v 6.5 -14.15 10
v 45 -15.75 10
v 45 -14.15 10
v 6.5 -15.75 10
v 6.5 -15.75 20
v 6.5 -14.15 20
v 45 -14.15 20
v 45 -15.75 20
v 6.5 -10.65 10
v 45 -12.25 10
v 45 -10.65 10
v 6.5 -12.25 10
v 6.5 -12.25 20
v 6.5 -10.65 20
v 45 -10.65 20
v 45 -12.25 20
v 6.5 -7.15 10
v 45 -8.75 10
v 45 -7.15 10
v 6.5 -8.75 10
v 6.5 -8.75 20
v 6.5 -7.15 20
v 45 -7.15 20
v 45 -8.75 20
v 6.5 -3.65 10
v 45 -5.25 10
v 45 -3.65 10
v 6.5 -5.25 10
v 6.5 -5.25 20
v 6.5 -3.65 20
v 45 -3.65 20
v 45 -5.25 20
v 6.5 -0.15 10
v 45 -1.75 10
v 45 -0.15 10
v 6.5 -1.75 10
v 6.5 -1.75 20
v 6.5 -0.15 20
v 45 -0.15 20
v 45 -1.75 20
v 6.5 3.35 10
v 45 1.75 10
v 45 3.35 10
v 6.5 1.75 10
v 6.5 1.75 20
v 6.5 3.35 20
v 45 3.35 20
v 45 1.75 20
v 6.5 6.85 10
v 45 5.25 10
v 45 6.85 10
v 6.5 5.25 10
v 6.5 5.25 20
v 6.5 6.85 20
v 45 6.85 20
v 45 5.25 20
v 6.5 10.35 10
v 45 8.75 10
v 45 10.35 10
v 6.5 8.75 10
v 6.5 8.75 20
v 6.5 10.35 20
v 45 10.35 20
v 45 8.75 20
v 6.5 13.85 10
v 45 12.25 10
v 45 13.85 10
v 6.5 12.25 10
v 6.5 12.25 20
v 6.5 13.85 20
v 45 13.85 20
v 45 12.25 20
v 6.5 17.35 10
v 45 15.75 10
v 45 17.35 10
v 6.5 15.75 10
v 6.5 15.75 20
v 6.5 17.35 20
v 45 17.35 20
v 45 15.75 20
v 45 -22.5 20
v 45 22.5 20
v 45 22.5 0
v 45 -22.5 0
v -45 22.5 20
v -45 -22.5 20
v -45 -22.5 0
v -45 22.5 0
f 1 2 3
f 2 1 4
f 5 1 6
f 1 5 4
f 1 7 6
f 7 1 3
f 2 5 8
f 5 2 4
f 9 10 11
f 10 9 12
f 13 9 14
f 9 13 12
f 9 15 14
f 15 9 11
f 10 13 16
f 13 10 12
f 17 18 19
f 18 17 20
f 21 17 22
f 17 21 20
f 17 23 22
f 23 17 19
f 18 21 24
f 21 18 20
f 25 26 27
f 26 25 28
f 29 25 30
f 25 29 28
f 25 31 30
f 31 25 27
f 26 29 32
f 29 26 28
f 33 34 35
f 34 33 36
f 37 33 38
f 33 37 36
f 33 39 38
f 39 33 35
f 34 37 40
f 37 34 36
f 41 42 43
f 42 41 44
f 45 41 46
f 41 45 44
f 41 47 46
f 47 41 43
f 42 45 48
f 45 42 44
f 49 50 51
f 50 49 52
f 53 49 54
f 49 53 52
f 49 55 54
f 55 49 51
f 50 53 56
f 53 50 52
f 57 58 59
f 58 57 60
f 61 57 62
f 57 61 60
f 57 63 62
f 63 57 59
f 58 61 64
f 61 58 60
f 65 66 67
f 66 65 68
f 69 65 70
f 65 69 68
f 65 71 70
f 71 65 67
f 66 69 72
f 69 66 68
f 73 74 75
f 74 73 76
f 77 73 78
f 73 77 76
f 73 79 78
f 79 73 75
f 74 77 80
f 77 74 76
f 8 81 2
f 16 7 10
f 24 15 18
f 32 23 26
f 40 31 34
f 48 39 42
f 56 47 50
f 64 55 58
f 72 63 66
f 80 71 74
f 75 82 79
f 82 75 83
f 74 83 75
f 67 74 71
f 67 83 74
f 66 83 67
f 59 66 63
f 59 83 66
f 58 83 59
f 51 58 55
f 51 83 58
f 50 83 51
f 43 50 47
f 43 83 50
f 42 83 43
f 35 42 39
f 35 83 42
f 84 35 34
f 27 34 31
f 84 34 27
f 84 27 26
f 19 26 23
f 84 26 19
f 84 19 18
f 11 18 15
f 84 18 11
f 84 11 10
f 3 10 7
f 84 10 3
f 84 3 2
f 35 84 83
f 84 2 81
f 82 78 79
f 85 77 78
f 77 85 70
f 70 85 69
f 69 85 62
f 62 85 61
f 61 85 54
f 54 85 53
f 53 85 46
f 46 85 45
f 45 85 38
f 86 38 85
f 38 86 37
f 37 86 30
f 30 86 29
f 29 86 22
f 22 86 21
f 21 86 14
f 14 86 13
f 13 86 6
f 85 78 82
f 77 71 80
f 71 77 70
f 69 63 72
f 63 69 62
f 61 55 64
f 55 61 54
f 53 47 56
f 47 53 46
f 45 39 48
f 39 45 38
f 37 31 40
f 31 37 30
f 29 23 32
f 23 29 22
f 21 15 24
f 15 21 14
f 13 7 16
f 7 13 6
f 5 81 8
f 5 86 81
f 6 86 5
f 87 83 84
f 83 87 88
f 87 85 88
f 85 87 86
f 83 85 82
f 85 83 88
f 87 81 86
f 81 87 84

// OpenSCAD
// Microscope slide drying rack
// Print orientation: base block on XY plane, slots open upward (+Z)

// ---------- Parameters ----------
block_len   = 90;    // block length along X (mm)
block_wid   = 45;    // block width along Y (mm)
block_ht    = 20;    // block height along Z (mm)

slot_count  = 10;    // number of slide slots
slot_len    = 77;    // slot length along X (mm)
slot_wid    = 1.6;   // slot width along Y (mm)
slot_depth  = 10;    // slot depth from top face (mm)
slot_pitch  = 3.5;   // centre-to-centre slot spacing along Y (mm)

eps         = 0.5;   // overcut past faces to avoid coplanar surfaces (mm)

$fn = 64;

// ---------- Derived ----------
slot_x0 = -(slot_len - block_len) / 2;              // first slot start X
slot_y0 = -(slot_count - 1) * slot_pitch / 2;       // first slot centre Y

// ---------- Model ----------
difference() {
    // Base block
    translate([-block_len / 2, -block_wid / 2, 0])
        cube([block_len, block_wid, block_ht]);

    // Parallel slots along X, centred on block in X and Y
    for (i = [0 : slot_count - 1]) {
        translate([slot_x0, slot_y0 + i * slot_pitch, block_ht - slot_depth])
            cube([slot_len, slot_wid, slot_depth + eps]);
    }
}
